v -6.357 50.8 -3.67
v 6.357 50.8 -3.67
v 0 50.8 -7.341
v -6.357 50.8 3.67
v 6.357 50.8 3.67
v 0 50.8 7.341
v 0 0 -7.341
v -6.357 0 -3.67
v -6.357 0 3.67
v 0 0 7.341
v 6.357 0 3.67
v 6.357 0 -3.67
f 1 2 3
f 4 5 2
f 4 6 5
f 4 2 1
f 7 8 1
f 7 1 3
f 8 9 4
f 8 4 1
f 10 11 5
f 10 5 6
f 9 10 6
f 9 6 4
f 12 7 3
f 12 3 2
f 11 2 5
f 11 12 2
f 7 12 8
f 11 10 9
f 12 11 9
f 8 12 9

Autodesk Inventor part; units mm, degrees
ref_plane "YZ Plane" through (0, 0, 0) normal (1, 0, 0) x (0, 1, 0)
ref_plane "XZ Plane" through (0, 0, 0) normal (0, 1, 0) x (-1, 0, 0)
ref_plane "XY Plane" through (0, 0, 0) normal (0, 0, 1) x (1, 0, 0)
sketch "Sketch1" plane through (0, 0, 0) normal (0, 1, 0) x (-1, 0, 0)
  line L0 (0, -7.3406) -> (-6.3571, -3.6703)
  line L1 (-6.3571, -3.6703) -> (-6.3571, 3.6703)
  line L2 (-6.3571, 3.6703) -> (0, 7.3406)
  line L3 (0, 7.3406) -> (6.3571, 3.6703)
  line L4 (6.3571, 3.6703) -> (6.3571, -3.6703)
  line L5 (6.3571, -3.6703) -> (0, -7.3406)
  point P0 (0, 0)
  point P1 (0, 0)
  dimension "d0" = 7.3406
extrude "Extrusion1" add sketch "Sketch1" along normal blind 50.8
properties part number "Arm short hex"
